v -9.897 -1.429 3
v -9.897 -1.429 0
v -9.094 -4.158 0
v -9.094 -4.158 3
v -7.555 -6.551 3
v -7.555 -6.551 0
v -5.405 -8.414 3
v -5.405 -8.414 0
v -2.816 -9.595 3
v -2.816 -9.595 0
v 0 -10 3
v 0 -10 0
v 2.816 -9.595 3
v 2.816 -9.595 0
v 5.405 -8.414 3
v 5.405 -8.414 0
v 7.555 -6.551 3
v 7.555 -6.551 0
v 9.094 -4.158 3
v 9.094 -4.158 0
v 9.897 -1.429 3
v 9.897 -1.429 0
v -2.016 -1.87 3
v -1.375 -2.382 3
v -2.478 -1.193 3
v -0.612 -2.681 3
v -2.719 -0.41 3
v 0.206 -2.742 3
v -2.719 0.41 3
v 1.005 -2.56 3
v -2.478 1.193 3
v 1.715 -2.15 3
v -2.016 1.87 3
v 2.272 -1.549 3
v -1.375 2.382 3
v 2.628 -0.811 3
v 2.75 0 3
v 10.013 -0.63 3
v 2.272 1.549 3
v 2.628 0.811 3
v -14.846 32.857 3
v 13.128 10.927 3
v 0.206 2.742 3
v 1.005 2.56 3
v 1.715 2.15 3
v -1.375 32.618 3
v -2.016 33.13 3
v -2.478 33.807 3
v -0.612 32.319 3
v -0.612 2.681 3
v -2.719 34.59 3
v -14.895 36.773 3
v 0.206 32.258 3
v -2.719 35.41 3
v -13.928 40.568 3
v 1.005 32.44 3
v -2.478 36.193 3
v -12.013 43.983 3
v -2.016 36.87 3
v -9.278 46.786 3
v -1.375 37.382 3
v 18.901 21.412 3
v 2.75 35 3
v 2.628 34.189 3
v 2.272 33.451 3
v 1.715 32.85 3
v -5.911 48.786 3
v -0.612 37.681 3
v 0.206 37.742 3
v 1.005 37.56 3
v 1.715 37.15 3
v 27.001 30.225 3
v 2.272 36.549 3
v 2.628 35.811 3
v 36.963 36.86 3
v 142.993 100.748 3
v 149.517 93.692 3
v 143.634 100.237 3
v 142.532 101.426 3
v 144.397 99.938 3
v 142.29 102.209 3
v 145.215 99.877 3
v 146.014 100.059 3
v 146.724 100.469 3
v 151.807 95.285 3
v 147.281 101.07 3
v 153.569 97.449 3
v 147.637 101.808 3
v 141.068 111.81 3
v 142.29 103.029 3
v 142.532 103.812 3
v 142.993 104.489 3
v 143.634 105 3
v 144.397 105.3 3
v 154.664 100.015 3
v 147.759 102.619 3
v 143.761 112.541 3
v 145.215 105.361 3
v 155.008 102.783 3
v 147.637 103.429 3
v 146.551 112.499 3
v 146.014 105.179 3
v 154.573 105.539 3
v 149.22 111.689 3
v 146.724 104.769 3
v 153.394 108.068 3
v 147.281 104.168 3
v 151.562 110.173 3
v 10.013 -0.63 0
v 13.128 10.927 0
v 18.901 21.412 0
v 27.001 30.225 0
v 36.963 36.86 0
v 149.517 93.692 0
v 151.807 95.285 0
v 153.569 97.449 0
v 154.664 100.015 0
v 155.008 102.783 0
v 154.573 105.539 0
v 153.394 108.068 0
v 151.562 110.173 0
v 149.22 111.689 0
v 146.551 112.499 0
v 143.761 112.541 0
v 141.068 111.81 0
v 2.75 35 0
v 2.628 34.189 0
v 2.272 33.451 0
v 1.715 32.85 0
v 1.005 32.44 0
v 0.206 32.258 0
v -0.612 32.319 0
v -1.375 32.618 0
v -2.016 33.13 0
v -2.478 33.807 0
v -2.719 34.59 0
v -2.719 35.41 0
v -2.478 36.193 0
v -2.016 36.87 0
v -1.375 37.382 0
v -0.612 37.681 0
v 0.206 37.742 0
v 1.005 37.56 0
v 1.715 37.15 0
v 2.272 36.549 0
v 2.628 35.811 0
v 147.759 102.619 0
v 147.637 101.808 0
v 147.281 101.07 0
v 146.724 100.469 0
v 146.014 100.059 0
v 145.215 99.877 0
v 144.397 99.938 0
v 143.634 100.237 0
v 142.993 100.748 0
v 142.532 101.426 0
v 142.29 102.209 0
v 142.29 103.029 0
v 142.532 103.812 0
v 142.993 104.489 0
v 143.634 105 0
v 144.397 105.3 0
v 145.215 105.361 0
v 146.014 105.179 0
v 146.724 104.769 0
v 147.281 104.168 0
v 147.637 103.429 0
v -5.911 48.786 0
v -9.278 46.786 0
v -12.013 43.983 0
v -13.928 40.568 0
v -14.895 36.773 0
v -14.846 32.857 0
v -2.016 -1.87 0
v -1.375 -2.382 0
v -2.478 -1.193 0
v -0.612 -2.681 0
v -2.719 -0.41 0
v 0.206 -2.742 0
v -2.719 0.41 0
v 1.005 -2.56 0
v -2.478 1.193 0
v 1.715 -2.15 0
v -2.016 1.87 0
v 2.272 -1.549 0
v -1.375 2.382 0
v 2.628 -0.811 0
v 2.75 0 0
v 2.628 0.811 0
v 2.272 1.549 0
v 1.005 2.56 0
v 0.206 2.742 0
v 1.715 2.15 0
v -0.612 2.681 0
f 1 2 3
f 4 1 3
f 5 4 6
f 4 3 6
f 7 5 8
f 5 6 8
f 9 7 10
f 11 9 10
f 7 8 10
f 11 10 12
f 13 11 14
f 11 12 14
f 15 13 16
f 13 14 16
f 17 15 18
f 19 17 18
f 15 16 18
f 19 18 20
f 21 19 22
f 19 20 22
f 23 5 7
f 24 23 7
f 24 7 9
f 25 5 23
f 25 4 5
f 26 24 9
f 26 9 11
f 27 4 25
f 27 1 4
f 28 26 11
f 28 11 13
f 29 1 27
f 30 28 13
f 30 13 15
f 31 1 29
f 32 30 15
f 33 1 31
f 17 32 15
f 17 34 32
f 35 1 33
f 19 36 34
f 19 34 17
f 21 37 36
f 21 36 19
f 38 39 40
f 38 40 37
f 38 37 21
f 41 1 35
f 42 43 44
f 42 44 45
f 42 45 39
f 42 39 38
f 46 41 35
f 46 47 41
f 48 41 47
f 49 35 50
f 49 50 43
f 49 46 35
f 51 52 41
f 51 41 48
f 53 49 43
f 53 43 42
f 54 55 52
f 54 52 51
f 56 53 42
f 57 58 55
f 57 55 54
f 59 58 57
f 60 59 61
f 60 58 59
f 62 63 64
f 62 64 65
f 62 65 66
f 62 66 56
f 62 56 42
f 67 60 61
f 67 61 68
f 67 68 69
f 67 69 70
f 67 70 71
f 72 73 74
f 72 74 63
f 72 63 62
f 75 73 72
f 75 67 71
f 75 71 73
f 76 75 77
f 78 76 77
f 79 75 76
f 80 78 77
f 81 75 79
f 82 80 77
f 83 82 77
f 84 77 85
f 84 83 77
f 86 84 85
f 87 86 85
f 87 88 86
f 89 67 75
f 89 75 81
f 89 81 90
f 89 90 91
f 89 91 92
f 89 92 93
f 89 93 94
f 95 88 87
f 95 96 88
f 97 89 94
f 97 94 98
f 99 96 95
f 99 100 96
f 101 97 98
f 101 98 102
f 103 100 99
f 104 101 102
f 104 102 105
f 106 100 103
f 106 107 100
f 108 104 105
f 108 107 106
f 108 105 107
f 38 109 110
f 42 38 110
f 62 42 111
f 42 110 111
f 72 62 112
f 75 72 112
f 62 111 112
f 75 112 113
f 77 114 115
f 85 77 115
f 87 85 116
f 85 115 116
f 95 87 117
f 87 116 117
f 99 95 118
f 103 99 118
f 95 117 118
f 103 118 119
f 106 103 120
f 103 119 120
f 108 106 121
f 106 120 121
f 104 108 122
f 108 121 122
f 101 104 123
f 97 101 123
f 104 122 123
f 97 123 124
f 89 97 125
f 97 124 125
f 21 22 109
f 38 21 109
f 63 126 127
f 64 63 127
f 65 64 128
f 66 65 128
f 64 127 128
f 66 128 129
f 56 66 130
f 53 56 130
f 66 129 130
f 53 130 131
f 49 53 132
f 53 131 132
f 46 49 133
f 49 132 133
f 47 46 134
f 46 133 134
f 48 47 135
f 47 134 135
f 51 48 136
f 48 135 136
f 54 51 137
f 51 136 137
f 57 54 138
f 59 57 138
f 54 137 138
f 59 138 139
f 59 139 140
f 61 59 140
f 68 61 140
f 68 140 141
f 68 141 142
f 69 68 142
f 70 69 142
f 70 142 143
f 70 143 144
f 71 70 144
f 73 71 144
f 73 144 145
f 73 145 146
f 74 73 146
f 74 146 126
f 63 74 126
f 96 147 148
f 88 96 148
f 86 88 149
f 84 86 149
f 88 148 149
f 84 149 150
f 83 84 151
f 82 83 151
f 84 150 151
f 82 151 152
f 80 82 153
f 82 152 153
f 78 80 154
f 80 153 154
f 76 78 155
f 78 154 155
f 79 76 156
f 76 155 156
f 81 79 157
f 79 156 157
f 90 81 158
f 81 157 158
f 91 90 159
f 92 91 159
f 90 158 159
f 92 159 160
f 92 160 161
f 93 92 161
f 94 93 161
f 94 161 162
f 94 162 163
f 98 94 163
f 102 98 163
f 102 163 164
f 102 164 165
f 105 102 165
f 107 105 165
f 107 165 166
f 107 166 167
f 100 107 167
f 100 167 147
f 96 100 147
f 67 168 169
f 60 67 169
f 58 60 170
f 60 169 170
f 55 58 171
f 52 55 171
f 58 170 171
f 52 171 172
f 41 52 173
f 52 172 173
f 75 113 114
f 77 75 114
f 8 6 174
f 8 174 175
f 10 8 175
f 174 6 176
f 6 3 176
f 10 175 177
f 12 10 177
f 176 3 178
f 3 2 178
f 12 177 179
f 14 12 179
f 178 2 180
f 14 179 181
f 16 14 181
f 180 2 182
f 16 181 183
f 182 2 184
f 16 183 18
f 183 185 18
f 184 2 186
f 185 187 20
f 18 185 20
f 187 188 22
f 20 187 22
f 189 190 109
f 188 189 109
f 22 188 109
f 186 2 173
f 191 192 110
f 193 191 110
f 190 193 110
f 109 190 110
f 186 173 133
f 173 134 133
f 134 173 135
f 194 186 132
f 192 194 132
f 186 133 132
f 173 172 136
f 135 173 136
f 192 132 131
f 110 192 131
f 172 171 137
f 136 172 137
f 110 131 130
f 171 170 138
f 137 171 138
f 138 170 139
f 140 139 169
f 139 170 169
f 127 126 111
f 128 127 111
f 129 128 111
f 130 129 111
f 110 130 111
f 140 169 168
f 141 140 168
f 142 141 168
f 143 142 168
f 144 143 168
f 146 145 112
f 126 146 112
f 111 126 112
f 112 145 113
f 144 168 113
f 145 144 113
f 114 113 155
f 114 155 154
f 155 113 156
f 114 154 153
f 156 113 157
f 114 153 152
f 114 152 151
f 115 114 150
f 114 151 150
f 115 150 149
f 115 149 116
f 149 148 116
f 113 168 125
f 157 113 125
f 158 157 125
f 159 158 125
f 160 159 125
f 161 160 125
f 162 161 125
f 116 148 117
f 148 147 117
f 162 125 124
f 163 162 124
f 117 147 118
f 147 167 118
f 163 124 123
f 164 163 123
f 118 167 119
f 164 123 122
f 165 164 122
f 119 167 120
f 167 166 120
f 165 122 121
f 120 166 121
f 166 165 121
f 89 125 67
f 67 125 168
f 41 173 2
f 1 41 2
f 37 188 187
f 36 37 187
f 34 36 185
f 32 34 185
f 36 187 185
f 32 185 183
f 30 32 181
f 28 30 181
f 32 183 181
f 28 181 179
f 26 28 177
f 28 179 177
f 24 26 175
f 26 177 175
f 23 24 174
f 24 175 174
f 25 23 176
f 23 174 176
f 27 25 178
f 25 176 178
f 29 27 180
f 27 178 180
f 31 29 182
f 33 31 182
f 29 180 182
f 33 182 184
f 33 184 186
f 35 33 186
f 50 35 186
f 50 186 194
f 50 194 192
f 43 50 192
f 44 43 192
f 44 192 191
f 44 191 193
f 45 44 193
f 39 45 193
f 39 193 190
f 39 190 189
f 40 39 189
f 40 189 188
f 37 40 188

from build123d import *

# Parameters (mm, degrees)
ESQUISSE4_R        = 10
ESQUISSE4_R_2      = 15
BOSS_EXTRU_1_DEPTH = 3
D_GAGEMENT_M51_D   = 5.5


with BuildPart() as part:
    # Esquisse4 → Boss.-Extru.1 (new body)
    with BuildSketch(Plane.XY):
        with Locations((145.009245926, 102.618921879)):
            Circle(ESQUISSE4_R)
        with BuildLine():
            Line((36.96319164, 36.860248406), (149.516585657, 93.692338627))
            ThreePointArc((149.516585657, 93.692338627), (135.946168055, 98.392739261), (141.068348562, 111.809641544))
            Line((141.068348562, 111.809641544), (-5.911346046, 48.786079498))
            ThreePointArc((-5.911346046, 48.786079498), (8.25620401, 47.523381945), (15, 35))
            ThreePointArc((15, 35), (14.961488006, 33.925813491), (14.846149779, 32.857142857))
            Line((14.846149779, 32.857142857), (13.730743914, 25.129384342))
            Line((13.730743914, 25.129384342), (36.96319164, 36.860248406))
        make_face()
        with Locations((0, 35)):
            Circle(ESQUISSE4_R_2)
        with BuildLine():
            Line((10.012724365, -0.629810709), (13.730743914, 25.129384342))
            Line((13.730743914, 25.129384342), (6.761009597, 21.610125123))
            ThreePointArc((6.761009597, 21.610125123), (-6.925765295, 21.69459602), (-14.846149779, 32.857142857))
            Line((-14.846149779, 32.857142857), (-9.897433186, -1.428571429))
            ThreePointArc((-9.897433186, -1.428571429), (-0.716124339, 9.974325337), (10, 0))
            ThreePointArc((10, 0), (9.974325337, -0.716124339), (9.897433186, -1.428571429))
            Line((9.897433186, -1.428571429), (10.012724365, -0.629810709))
        make_face()
        Circle(ESQUISSE4_R)
        with BuildLine():
            ThreePointArc((10.012724365, -0.629810709), (18.9014248, 21.412338562), (36.96319164, 36.860248406))
            Line((36.96319164, 36.860248406), (13.730743914, 25.129384342))
            Line((13.730743914, 25.129384342), (10.012724365, -0.629810709))
        make_face()
        with BuildLine():
            Line((6.761009597, 21.610125123), (13.730743914, 25.129384342))
            Line((13.730743914, 25.129384342), (14.846149779, 32.857142857))
            ThreePointArc((14.846149779, 32.857142857), (12.179539649, 26.244498076), (6.761009597, 21.610125123))
        make_face()
    extrude(amount=BOSS_EXTRU_1_DEPTH)

    # Dégagement M51 (through all)
    with Locations(Plane(origin=(0, 0, 3), x_dir=(-1, 0, 0), z_dir=(0, 0, 1))):
        with Locations((-145.009245926, -102.618921879), (0, -35), (0, 0)):
            Hole(D_GAGEMENT_M51_D / 2)


solid = part.part
